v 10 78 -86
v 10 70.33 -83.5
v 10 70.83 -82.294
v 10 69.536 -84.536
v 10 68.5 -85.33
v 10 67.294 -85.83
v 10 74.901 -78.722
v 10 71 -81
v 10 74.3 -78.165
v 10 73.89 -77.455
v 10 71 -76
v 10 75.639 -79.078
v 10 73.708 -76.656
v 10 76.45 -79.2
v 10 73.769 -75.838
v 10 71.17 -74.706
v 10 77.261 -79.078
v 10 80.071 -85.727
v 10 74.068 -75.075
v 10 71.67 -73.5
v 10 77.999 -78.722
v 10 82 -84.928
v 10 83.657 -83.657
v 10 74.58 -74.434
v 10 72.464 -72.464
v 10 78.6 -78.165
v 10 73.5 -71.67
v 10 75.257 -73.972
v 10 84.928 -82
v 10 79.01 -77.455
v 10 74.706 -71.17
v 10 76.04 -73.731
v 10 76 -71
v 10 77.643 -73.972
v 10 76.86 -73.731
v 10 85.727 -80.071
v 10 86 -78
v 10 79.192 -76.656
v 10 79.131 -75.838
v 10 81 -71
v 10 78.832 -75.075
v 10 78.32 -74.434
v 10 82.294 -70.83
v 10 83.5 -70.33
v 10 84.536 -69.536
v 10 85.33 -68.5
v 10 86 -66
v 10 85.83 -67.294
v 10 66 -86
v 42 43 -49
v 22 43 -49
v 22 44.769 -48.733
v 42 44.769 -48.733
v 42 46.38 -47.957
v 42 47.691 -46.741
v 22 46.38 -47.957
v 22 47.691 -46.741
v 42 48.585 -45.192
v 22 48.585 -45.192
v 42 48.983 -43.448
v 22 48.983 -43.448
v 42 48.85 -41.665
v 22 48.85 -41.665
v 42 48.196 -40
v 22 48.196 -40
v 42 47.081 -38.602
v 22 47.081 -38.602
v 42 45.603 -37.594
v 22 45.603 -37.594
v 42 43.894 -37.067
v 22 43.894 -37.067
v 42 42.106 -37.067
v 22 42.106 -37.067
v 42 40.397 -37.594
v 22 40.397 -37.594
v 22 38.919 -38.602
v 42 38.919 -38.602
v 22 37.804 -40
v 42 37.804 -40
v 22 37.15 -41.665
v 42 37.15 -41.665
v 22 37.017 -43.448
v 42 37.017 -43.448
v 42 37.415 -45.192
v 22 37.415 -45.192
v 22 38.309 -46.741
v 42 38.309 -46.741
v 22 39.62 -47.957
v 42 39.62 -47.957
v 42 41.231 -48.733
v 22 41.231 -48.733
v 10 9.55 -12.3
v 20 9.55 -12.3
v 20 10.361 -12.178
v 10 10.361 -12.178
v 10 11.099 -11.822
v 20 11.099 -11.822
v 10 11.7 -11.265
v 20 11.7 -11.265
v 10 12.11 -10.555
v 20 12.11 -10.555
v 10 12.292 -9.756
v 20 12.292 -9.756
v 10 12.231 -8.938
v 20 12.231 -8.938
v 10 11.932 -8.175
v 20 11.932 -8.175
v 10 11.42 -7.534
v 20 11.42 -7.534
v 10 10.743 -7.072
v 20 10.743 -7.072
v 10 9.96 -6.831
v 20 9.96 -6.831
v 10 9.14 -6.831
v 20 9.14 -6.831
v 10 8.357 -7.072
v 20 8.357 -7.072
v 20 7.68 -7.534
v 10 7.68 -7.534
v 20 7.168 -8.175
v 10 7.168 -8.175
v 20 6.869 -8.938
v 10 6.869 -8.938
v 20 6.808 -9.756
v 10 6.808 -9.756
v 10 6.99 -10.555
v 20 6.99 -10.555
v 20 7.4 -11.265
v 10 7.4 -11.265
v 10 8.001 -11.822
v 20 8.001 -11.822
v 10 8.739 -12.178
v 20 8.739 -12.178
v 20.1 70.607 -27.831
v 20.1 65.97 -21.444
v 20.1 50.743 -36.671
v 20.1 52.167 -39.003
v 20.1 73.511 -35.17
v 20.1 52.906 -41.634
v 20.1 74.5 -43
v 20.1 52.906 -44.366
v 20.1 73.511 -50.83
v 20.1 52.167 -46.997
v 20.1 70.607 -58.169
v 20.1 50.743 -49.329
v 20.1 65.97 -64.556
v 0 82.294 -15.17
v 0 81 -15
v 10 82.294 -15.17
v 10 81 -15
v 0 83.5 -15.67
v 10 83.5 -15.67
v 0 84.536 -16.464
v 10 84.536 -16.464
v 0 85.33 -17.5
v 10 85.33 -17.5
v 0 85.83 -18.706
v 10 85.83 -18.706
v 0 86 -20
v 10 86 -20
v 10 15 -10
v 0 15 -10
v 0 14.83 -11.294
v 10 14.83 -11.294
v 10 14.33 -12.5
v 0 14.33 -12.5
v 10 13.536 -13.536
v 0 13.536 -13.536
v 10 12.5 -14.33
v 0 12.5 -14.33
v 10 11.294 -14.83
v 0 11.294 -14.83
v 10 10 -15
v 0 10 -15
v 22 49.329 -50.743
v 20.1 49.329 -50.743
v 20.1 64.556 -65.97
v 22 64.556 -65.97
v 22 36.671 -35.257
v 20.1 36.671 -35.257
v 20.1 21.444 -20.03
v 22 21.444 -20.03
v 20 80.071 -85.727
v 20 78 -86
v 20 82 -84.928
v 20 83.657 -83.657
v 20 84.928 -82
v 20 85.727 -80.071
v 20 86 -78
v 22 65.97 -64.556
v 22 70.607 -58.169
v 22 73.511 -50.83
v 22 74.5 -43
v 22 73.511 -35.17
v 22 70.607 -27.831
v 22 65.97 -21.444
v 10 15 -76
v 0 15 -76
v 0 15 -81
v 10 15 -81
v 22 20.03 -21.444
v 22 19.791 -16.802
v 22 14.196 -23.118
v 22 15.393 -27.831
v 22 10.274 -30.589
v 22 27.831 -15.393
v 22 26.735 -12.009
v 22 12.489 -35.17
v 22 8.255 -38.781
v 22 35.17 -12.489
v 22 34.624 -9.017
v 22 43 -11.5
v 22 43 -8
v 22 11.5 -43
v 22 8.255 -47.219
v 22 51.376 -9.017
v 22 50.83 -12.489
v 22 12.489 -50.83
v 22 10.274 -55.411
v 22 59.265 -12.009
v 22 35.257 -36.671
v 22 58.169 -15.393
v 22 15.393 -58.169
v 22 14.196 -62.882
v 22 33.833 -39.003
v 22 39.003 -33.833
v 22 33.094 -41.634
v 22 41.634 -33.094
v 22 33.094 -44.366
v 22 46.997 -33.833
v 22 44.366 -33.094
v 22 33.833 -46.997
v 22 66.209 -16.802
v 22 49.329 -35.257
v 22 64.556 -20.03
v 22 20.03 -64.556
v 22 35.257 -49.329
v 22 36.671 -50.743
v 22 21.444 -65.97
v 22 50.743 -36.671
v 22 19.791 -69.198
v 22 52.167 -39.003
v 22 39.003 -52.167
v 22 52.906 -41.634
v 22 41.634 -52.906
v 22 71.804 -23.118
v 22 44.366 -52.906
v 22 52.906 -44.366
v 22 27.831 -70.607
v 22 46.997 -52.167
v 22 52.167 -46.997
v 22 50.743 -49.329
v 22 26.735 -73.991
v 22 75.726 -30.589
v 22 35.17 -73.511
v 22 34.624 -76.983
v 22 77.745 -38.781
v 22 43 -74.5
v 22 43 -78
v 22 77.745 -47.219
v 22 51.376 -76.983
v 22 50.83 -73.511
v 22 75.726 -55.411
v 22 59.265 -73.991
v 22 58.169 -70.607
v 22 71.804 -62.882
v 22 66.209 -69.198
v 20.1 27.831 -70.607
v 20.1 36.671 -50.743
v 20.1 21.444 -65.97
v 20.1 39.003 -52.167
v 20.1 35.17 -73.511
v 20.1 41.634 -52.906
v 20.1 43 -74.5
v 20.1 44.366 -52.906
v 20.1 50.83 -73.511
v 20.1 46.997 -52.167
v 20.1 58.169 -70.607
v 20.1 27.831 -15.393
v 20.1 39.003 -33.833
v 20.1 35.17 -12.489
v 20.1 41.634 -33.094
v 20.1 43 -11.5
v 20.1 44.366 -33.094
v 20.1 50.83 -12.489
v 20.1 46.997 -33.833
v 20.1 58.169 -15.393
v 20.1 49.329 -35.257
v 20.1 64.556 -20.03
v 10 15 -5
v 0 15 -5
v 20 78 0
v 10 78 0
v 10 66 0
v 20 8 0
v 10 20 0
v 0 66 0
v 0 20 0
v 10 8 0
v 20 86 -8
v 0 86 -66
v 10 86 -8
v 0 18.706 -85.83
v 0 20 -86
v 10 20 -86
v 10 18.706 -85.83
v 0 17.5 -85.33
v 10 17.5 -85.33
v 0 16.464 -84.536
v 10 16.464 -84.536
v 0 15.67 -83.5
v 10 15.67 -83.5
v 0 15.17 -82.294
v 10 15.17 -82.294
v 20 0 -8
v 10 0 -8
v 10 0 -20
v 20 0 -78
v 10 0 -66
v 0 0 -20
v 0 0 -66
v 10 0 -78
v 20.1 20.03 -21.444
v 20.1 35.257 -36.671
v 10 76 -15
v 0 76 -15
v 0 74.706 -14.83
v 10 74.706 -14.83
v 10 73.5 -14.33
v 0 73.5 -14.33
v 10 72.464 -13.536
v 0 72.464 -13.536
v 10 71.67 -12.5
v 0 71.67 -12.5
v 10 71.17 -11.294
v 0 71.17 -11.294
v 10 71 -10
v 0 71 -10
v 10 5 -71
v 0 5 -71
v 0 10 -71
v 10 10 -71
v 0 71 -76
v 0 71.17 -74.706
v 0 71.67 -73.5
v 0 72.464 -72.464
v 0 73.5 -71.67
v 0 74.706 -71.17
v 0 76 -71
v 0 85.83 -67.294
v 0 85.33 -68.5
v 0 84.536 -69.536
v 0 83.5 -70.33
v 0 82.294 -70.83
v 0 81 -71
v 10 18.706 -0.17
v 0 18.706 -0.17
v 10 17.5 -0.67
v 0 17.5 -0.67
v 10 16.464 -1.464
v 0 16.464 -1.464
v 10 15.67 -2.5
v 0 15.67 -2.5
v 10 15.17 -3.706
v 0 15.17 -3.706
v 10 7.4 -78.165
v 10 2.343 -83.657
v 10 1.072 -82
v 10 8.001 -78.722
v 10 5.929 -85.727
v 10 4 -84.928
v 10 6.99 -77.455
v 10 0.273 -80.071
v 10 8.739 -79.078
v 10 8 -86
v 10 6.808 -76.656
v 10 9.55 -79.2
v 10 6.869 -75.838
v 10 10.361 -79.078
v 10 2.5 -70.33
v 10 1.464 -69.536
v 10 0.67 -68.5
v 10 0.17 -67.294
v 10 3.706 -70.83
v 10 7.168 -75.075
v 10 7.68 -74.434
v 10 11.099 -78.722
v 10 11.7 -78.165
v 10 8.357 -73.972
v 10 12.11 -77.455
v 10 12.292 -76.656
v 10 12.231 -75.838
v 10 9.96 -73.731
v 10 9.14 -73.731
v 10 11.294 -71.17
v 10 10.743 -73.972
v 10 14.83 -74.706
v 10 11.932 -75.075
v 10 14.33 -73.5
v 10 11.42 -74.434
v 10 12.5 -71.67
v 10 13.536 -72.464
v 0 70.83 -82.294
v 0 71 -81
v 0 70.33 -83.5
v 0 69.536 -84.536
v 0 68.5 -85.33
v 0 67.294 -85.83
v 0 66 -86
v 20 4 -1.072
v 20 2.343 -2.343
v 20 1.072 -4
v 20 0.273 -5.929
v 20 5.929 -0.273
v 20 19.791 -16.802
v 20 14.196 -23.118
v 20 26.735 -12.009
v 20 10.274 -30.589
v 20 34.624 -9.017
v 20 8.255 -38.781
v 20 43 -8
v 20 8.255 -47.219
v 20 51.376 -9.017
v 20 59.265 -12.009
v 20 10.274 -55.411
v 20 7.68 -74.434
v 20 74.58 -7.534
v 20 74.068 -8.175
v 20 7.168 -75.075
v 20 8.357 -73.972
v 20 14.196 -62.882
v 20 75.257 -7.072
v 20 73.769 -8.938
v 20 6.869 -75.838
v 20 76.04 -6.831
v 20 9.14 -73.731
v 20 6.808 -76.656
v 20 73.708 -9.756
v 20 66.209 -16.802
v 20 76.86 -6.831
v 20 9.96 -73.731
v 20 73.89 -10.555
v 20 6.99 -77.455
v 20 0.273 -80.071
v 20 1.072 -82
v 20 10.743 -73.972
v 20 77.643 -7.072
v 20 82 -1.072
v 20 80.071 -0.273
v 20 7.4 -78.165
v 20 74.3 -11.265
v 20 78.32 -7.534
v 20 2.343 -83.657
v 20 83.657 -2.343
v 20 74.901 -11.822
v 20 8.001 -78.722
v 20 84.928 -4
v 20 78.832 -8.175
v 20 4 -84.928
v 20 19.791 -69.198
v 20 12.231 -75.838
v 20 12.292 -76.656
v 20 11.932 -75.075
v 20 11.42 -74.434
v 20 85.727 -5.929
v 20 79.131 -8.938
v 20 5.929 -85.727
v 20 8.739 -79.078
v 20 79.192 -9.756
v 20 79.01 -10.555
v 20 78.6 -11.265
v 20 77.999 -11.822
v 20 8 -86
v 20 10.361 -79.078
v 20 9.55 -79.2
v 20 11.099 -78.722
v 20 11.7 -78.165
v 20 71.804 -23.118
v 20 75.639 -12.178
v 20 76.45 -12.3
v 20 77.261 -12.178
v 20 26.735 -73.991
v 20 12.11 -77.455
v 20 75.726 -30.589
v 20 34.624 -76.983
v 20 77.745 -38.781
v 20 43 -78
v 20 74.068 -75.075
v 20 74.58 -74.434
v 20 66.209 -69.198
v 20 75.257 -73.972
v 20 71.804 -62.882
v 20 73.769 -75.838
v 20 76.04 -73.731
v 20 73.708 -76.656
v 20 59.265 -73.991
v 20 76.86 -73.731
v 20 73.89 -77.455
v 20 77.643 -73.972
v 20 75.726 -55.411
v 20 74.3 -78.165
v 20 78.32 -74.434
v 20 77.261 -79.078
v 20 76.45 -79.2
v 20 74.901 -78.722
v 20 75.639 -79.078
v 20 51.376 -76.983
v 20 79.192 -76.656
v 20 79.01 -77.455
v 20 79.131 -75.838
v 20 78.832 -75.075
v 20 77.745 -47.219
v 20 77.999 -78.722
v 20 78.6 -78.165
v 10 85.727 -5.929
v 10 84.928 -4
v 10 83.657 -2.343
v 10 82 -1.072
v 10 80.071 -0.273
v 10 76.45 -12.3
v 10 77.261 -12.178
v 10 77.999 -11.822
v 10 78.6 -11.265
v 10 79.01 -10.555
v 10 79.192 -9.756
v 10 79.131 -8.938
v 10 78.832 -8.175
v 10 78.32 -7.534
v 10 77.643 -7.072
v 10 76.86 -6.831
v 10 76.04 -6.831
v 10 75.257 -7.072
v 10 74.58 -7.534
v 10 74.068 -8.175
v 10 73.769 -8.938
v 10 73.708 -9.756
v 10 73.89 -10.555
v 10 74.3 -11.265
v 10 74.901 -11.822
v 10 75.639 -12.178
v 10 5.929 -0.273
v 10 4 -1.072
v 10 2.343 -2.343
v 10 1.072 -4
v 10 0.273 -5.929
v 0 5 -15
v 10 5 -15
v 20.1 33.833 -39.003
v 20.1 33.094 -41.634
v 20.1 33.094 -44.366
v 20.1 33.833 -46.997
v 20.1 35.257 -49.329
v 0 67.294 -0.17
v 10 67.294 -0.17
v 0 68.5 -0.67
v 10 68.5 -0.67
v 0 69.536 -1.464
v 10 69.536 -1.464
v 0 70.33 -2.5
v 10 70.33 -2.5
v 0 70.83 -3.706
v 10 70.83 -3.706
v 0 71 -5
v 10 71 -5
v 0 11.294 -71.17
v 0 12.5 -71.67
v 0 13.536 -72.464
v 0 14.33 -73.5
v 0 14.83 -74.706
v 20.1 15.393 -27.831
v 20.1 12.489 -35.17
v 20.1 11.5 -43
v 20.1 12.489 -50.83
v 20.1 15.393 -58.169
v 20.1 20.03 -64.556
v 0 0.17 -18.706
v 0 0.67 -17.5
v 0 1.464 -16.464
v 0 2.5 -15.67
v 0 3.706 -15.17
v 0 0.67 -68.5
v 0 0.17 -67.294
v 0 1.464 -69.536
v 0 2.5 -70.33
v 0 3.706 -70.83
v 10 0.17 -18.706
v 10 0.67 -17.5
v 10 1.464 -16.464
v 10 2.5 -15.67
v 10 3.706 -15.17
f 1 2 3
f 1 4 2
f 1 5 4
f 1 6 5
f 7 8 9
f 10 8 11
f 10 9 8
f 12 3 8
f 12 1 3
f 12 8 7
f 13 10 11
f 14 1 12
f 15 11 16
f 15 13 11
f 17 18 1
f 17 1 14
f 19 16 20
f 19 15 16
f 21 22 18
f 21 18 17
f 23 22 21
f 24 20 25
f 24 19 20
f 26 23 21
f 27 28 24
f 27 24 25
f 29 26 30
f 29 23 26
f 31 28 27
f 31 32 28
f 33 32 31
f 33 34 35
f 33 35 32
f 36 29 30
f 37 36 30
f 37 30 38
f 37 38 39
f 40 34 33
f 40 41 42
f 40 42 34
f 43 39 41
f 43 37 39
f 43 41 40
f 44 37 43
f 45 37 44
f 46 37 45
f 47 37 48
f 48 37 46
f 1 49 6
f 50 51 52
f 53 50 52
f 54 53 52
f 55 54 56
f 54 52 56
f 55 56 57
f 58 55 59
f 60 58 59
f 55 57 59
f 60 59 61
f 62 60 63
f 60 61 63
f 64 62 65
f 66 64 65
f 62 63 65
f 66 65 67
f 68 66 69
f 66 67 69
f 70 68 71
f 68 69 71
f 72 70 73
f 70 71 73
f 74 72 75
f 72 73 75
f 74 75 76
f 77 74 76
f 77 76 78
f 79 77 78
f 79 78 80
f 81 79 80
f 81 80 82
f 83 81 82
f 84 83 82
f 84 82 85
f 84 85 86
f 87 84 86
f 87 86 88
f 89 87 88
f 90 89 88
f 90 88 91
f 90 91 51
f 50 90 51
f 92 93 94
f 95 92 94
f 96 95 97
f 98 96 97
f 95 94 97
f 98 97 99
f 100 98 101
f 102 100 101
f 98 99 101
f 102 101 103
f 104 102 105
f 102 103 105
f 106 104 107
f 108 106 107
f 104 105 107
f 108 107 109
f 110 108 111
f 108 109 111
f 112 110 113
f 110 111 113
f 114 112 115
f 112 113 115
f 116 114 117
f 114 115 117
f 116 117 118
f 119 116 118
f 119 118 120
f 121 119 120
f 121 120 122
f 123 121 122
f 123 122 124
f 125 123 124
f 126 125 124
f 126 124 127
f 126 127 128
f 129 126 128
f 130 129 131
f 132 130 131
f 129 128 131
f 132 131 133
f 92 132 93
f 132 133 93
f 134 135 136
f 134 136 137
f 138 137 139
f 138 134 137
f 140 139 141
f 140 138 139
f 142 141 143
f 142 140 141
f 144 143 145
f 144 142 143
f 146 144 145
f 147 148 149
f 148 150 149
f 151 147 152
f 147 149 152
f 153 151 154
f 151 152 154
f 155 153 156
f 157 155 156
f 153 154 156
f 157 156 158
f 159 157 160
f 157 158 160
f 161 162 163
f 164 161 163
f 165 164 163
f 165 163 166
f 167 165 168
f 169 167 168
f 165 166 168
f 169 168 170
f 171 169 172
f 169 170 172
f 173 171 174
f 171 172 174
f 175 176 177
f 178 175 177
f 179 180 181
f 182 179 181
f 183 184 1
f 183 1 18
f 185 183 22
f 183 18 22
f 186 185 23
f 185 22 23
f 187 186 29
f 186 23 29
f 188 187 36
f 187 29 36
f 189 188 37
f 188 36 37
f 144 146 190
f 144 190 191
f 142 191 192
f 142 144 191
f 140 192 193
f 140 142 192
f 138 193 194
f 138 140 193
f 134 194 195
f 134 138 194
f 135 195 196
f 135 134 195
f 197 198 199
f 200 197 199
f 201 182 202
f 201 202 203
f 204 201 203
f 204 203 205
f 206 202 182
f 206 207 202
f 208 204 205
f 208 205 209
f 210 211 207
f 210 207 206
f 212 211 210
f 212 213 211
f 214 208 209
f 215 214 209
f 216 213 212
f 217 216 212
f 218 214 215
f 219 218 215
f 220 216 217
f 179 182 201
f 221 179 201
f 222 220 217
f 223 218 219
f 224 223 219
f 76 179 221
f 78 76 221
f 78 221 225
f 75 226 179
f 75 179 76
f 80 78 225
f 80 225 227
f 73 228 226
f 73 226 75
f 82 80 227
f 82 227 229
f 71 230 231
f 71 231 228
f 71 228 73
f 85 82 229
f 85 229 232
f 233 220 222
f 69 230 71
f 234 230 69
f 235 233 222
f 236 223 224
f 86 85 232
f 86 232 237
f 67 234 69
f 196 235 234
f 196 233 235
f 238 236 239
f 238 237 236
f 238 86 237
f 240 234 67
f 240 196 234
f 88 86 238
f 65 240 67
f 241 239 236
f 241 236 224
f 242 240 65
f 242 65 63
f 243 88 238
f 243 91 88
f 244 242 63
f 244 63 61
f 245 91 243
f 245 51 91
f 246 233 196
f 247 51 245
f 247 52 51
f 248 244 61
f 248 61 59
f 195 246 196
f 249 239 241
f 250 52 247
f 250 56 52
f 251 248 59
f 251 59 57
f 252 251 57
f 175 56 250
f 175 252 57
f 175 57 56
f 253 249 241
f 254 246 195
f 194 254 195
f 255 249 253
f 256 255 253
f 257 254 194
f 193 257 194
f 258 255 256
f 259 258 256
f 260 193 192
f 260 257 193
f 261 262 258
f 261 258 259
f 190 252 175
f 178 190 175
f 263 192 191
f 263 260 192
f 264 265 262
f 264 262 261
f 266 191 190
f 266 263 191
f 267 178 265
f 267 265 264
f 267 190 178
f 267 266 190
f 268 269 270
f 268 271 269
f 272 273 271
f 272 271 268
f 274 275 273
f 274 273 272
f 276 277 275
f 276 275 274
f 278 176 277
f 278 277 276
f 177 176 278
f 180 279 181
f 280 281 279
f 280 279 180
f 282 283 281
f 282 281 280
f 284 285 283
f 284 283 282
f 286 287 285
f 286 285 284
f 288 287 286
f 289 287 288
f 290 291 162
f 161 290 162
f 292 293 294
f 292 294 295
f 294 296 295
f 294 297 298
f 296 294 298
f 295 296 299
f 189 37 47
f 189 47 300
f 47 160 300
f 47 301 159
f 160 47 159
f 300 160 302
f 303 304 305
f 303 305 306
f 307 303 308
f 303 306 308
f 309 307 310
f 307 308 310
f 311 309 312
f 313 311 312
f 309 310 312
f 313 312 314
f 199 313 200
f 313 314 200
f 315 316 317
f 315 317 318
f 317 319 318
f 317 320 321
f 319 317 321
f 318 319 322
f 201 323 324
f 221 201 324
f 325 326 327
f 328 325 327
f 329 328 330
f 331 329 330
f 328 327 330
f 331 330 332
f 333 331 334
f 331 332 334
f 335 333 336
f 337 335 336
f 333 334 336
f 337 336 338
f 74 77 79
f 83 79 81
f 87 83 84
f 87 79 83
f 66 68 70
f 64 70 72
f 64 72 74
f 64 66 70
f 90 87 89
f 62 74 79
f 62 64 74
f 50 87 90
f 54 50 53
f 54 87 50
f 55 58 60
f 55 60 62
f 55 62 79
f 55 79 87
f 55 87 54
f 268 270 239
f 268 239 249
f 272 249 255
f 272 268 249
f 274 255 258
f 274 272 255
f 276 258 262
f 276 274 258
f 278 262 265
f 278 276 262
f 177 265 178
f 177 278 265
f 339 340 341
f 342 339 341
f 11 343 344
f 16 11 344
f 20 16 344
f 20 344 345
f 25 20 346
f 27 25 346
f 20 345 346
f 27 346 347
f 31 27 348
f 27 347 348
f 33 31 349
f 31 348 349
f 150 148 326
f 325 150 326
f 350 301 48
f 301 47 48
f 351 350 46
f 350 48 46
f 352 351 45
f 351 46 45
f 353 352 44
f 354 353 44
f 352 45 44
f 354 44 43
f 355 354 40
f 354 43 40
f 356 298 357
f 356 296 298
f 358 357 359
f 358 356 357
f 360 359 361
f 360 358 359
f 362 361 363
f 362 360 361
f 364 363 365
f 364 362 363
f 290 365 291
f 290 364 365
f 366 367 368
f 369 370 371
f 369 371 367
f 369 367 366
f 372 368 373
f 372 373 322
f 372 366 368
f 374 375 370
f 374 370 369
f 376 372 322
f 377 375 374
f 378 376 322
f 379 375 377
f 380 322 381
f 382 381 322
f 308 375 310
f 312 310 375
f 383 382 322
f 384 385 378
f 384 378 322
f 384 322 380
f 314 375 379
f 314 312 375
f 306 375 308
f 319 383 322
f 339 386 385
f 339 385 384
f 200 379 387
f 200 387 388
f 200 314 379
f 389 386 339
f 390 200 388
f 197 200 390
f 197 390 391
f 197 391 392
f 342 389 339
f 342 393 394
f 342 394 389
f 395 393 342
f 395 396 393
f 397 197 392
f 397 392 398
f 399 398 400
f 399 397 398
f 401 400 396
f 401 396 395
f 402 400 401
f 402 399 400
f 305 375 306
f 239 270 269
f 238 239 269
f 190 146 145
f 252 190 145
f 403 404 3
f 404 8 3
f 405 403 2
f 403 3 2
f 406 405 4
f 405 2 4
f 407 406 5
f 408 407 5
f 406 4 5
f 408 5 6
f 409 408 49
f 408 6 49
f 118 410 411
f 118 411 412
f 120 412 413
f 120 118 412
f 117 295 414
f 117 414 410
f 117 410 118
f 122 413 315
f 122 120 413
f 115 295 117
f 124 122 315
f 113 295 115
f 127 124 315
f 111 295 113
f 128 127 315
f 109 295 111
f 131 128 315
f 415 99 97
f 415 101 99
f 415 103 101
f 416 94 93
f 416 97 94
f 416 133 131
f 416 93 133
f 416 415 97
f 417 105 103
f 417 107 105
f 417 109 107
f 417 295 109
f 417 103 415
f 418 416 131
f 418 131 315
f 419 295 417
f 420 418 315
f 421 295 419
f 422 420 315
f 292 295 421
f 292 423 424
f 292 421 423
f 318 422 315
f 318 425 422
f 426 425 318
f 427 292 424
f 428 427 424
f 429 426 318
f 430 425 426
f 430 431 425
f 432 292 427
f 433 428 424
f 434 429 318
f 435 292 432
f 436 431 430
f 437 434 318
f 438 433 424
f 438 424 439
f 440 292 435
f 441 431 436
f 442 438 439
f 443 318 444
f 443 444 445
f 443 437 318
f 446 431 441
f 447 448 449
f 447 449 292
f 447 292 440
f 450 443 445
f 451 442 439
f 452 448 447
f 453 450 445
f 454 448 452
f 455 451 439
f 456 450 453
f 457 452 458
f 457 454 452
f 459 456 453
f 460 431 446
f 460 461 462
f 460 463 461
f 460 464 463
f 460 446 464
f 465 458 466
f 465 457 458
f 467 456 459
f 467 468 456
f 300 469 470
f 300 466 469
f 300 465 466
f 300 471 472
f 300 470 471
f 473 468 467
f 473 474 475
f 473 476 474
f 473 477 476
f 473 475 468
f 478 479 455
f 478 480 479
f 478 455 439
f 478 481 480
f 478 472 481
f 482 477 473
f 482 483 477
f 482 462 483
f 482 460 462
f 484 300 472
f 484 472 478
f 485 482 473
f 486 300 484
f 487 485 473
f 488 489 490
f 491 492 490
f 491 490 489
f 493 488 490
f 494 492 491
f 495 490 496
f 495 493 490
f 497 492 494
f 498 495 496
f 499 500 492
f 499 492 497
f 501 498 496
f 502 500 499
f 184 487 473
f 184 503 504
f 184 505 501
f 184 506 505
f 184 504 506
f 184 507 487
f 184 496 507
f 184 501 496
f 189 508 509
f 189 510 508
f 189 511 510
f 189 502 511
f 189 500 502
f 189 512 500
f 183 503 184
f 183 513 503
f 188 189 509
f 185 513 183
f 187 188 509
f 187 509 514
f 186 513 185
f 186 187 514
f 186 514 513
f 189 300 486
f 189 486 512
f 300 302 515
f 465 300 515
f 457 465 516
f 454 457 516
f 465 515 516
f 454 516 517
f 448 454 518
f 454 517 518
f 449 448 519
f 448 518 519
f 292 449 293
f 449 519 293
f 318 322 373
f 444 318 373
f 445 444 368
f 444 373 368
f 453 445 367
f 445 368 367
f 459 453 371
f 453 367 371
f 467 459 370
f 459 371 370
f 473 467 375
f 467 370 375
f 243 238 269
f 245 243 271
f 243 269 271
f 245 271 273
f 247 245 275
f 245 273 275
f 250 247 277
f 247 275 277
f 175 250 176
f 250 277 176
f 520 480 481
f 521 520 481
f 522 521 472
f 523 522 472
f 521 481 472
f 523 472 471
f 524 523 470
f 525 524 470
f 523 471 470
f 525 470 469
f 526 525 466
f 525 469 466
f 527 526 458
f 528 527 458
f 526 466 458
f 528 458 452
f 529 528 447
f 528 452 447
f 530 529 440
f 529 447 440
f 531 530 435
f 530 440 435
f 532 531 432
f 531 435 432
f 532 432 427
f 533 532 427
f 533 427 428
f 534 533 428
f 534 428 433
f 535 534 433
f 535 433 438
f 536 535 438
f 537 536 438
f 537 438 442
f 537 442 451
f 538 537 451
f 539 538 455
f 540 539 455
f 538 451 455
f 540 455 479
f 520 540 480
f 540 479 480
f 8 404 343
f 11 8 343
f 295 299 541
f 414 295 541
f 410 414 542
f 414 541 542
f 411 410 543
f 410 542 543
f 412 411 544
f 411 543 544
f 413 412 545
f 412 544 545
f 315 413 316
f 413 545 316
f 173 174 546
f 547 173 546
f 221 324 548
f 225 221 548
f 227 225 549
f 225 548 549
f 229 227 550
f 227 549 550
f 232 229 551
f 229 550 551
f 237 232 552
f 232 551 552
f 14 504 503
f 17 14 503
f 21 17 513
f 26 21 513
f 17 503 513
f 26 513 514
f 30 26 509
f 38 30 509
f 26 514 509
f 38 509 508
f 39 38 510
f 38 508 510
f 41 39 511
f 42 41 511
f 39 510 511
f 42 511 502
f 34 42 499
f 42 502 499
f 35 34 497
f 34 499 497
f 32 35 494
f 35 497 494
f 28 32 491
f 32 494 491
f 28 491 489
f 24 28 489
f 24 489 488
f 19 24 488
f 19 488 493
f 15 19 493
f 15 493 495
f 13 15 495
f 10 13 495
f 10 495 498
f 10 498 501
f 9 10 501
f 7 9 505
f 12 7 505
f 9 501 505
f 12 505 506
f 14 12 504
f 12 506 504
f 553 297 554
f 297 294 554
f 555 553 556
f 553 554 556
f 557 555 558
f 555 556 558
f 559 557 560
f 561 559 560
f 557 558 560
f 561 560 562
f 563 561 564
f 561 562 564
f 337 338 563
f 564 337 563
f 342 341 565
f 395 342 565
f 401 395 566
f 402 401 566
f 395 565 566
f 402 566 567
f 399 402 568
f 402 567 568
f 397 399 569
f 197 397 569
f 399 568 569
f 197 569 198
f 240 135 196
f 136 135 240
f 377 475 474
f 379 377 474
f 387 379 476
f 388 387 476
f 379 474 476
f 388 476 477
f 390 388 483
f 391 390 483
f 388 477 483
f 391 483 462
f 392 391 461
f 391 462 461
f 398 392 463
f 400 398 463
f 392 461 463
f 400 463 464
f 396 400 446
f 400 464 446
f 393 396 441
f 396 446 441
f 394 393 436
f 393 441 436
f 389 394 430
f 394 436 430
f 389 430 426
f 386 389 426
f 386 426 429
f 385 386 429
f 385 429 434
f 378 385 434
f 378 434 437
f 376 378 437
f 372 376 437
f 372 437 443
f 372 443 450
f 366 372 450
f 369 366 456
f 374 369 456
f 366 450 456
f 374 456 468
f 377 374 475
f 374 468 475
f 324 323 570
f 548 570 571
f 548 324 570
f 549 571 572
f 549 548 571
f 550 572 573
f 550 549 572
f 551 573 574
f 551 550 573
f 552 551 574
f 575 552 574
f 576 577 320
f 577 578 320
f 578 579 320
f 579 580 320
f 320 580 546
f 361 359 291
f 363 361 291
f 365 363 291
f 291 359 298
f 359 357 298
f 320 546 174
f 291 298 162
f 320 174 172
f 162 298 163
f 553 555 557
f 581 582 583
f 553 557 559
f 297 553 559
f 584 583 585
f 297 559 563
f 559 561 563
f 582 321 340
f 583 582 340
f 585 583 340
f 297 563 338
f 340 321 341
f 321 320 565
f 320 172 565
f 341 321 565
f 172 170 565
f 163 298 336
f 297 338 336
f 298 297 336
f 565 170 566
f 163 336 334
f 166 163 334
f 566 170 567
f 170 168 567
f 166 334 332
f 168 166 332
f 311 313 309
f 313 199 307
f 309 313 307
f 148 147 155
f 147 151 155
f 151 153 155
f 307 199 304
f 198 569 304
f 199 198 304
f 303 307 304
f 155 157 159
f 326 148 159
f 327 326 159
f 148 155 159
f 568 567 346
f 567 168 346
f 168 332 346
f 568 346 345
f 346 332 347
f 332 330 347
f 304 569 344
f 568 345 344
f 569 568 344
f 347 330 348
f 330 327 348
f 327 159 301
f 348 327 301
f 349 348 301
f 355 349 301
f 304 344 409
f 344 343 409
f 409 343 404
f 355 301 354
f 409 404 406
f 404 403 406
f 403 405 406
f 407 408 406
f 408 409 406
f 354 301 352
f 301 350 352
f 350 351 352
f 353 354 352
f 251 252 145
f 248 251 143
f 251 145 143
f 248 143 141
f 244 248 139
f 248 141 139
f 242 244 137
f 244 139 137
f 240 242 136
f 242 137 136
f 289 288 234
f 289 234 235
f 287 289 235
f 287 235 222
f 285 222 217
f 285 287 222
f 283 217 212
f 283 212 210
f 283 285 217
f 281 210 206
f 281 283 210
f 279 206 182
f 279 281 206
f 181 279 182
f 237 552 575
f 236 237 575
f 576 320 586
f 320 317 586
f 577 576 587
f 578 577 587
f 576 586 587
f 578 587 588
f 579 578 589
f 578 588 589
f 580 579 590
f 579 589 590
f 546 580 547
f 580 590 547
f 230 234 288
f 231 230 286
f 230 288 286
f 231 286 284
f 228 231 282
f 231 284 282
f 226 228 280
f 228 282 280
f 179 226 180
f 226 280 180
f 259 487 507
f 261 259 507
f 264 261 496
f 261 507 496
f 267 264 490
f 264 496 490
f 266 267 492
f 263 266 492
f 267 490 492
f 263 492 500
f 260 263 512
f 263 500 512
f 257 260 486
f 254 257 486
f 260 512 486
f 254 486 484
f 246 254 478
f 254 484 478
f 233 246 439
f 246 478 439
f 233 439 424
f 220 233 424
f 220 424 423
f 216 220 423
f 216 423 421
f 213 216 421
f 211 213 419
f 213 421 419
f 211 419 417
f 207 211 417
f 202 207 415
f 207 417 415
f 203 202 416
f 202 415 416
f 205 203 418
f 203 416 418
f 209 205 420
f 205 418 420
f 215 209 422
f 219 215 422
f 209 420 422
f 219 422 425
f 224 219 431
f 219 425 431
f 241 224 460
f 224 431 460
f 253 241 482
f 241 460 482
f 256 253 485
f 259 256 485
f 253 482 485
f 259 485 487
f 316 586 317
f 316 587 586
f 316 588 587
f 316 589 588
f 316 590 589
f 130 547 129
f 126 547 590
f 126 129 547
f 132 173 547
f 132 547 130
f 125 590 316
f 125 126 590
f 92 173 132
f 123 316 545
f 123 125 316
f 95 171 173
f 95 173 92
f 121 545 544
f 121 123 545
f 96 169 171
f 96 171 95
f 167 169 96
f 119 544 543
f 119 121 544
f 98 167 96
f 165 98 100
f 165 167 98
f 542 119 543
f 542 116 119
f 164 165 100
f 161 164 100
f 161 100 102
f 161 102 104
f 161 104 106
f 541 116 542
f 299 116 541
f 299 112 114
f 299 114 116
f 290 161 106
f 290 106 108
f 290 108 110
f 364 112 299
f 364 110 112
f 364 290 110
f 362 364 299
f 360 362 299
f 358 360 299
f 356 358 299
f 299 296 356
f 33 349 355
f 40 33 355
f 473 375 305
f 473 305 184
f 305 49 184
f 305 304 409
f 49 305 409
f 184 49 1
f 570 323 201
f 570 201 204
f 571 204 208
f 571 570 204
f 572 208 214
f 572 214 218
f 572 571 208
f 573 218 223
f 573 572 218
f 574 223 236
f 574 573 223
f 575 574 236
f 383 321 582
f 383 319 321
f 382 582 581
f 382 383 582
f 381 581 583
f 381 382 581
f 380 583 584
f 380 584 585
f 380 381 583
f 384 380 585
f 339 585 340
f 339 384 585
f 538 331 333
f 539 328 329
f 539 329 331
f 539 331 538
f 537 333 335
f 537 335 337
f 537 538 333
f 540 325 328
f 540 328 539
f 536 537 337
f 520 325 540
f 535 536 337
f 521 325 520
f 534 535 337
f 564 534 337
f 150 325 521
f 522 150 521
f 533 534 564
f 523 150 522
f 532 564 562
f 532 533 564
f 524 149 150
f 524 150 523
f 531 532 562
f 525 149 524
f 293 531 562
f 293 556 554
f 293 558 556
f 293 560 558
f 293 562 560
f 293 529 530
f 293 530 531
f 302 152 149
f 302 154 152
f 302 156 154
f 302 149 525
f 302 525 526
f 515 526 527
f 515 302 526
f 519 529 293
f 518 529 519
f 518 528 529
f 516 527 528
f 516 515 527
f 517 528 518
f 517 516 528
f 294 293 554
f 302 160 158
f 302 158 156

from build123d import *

# Parameters (mm, degrees)
BOSS_EXTRUDE1_DEPTH = 20
CUT_EXTRUDE1_DEPTH  = 10
FILLET1_R           = 5
SKETCH3_R           = 2.75
CUT_EXTRUDE2_DEPTH  = 10
SKETCH4_R           = 6
BOSS_EXTRUDE3_DEPTH = 22
SKETCH5_R           = 35
SKETCH5_R_2         = 31.5
SKETCH5_R_3         = 10
SKETCH5_R_4         = 6
BOSS_EXTRUDE4_DEPTH = 2
SKETCH6_R           = 31.5
SKETCH6_R_2         = 10
BOSS_EXTRUDE5_DEPTH = 0.1
BOSS_EXTRUDE6_DEPTH = 2


with BuildPart() as part:
    # Sketch1 → Boss-Extrude1 (new body)
    with BuildSketch(Plane(origin=(0, 0, 0), x_dir=(0, 0, -1), z_dir=(1, 0, 0))):
        with BuildLine():
            Line((8, 0), (78, 0))
            ThreePointArc((78, 0), (83.656854249, 2.343145751), (86, 8))
            Line((86, 8), (86, 78))
            ThreePointArc((86, 78), (83.656854249, 83.656854249), (78, 86))
            Line((78, 86), (8, 86))
            ThreePointArc((8, 86), (2.343145751, 83.656854249), (0, 78))
            Line((0, 78), (0, 8))
            ThreePointArc((0, 8), (2.343145751, 2.343145751), (8, 0))
        make_face()
    extrude(amount=BOSS_EXTRUDE1_DEPTH)

    # Sketch2 → Cut-Extrude1 (cut)
    with BuildSketch(Plane.ZY):
        with BuildLine():
            Line((-71, 76), (-71, 86))
            Line((-71, 86), (-78, 86))
            ThreePointArc((-78, 86), (-83.656854249, 83.656854249), (-86, 78))
            Line((-86, 78), (-86, 71))
            Line((-86, 71), (-76, 71))
            ThreePointArc((-76, 71), (-72.464466094, 72.464466094), (-71, 76))
        make_face()
        with BuildLine():
            Line((-8, 86), (-15, 86))
            Line((-15, 86), (-15, 76))
            ThreePointArc((-15, 76), (-13.535533906, 72.464466094), (-10, 71))
            Line((-10, 71), (0, 71))
            Line((0, 71), (0, 78))
            ThreePointArc((0, 78), (-2.343145751, 83.656854249), (-8, 86))
        make_face()
        with BuildLine():
            Line((0, 8), (0, 15))
            Line((0, 15), (-10, 15))
            ThreePointArc((-10, 15), (-13.535533906, 13.535533906), (-15, 10))
            Line((-15, 10), (-15, 0))
            Line((-15, 0), (-8, 0))
            ThreePointArc((-8, 0), (-2.343145751, 2.343145751), (0, 8))
        make_face()
        with BuildLine():
            Line((-76, 15), (-86, 15))
            Line((-86, 15), (-86, 8))
            ThreePointArc((-86, 8), (-83.656854249, 2.343145751), (-78, 0))
            Line((-78, 0), (-71, 0))
            Line((-71, 0), (-71, 10))
            ThreePointArc((-71, 10), (-72.464466094, 13.535533906), (-76, 15))
        make_face()
    extrude(amount=-CUT_EXTRUDE1_DEPTH, mode=Mode.SUBTRACT)

    # Fillet1
    fillet1_edges = [part.edges().sort_by_distance(p)[0] for p in [
        (5, 71, -86),
        (5, 86, -71),
        (5, 86, -15),
        (5, 71, 0),
        (5, 15, 0),
        (5, 0, -15),
        (5, 0, -71),
        (5, 15, -86),
    ]]
    fillet(fillet1_edges, radius=FILLET1_R)

    # Sketch3 → Cut-Extrude2 (cut)
    with BuildSketch(Plane(origin=(20, 0, 0), x_dir=(0, 0, -1), z_dir=(1, 0, 0))):
        with Locations((9.55, 76.45)):
            Circle(SKETCH3_R)
        with Locations((76.45, 76.45)):
            Circle(SKETCH3_R)
        with Locations((76.45, 9.55)):
            Circle(SKETCH3_R)
        with Locations((9.55, 9.55)):
            Circle(SKETCH3_R)
    extrude(amount=-CUT_EXTRUDE2_DEPTH, mode=Mode.SUBTRACT)

    # Sketch4 → Boss-Extrude3 (add)
    with BuildSketch(Plane(origin=(20, 0, 0), x_dir=(0, 0, -1), z_dir=(1, 0, 0))):
        with Locations((43, 43)):
            Circle(SKETCH4_R)
    extrude(amount=BOSS_EXTRUDE3_DEPTH)

    # Sketch5 → Boss-Extrude4 (add)
    with BuildSketch(Plane(origin=(20, 0, 0), x_dir=(0, 0, -1), z_dir=(1, 0, 0))):
        with Locations((43, 43)):
            Circle(SKETCH5_R)
        with Locations((43, 43)):
            Circle(SKETCH5_R_2, mode=Mode.SUBTRACT)
        with Locations((43, 43)):
            Circle(SKETCH5_R_3)
        with Locations((43, 43)):
            Circle(SKETCH5_R_4, mode=Mode.SUBTRACT)
    extrude(amount=BOSS_EXTRUDE4_DEPTH)

    # Sketch6 → Boss-Extrude5 (add)
    with BuildSketch(Plane(origin=(20, 0, 0), x_dir=(0, 0, -1), z_dir=(1, 0, 0))):
        with Locations((43, 43)):
            Circle(SKETCH6_R)
        with Locations((43, 43)):
            Circle(SKETCH6_R_2, mode=Mode.SUBTRACT)
    extrude(amount=BOSS_EXTRUDE5_DEPTH)

    # Sketch7 → Boss-Extrude6 (add)
    with BuildSketch(Plane(origin=(20, 0, 0), x_dir=(0, 0, -1), z_dir=(1, 0, 0))):
        Polygon((37.343145751, 50.071067812), (35.928932188, 48.656854249), (19.665476221, 64.920310217), (21.079689783, 66.334523779), align=None)
        Polygon((21.079689783, 19.665476221), (37.343145751, 35.928932188), (35.928932188, 37.343145751), (19.665476221, 21.079689783), align=None)
        Polygon((66.334523779, 21.079689783), (50.071067812, 37.343145751), (48.656854249, 35.928932188), (64.920310217, 19.665476221), align=None)
        Polygon((64.920310217, 66.334523779), (48.656854249, 50.071067812), (50.071067812, 48.656854249), (66.334523779, 64.920310217), align=None)
    extrude(amount=BOSS_EXTRUDE6_DEPTH)


solid = part.part
